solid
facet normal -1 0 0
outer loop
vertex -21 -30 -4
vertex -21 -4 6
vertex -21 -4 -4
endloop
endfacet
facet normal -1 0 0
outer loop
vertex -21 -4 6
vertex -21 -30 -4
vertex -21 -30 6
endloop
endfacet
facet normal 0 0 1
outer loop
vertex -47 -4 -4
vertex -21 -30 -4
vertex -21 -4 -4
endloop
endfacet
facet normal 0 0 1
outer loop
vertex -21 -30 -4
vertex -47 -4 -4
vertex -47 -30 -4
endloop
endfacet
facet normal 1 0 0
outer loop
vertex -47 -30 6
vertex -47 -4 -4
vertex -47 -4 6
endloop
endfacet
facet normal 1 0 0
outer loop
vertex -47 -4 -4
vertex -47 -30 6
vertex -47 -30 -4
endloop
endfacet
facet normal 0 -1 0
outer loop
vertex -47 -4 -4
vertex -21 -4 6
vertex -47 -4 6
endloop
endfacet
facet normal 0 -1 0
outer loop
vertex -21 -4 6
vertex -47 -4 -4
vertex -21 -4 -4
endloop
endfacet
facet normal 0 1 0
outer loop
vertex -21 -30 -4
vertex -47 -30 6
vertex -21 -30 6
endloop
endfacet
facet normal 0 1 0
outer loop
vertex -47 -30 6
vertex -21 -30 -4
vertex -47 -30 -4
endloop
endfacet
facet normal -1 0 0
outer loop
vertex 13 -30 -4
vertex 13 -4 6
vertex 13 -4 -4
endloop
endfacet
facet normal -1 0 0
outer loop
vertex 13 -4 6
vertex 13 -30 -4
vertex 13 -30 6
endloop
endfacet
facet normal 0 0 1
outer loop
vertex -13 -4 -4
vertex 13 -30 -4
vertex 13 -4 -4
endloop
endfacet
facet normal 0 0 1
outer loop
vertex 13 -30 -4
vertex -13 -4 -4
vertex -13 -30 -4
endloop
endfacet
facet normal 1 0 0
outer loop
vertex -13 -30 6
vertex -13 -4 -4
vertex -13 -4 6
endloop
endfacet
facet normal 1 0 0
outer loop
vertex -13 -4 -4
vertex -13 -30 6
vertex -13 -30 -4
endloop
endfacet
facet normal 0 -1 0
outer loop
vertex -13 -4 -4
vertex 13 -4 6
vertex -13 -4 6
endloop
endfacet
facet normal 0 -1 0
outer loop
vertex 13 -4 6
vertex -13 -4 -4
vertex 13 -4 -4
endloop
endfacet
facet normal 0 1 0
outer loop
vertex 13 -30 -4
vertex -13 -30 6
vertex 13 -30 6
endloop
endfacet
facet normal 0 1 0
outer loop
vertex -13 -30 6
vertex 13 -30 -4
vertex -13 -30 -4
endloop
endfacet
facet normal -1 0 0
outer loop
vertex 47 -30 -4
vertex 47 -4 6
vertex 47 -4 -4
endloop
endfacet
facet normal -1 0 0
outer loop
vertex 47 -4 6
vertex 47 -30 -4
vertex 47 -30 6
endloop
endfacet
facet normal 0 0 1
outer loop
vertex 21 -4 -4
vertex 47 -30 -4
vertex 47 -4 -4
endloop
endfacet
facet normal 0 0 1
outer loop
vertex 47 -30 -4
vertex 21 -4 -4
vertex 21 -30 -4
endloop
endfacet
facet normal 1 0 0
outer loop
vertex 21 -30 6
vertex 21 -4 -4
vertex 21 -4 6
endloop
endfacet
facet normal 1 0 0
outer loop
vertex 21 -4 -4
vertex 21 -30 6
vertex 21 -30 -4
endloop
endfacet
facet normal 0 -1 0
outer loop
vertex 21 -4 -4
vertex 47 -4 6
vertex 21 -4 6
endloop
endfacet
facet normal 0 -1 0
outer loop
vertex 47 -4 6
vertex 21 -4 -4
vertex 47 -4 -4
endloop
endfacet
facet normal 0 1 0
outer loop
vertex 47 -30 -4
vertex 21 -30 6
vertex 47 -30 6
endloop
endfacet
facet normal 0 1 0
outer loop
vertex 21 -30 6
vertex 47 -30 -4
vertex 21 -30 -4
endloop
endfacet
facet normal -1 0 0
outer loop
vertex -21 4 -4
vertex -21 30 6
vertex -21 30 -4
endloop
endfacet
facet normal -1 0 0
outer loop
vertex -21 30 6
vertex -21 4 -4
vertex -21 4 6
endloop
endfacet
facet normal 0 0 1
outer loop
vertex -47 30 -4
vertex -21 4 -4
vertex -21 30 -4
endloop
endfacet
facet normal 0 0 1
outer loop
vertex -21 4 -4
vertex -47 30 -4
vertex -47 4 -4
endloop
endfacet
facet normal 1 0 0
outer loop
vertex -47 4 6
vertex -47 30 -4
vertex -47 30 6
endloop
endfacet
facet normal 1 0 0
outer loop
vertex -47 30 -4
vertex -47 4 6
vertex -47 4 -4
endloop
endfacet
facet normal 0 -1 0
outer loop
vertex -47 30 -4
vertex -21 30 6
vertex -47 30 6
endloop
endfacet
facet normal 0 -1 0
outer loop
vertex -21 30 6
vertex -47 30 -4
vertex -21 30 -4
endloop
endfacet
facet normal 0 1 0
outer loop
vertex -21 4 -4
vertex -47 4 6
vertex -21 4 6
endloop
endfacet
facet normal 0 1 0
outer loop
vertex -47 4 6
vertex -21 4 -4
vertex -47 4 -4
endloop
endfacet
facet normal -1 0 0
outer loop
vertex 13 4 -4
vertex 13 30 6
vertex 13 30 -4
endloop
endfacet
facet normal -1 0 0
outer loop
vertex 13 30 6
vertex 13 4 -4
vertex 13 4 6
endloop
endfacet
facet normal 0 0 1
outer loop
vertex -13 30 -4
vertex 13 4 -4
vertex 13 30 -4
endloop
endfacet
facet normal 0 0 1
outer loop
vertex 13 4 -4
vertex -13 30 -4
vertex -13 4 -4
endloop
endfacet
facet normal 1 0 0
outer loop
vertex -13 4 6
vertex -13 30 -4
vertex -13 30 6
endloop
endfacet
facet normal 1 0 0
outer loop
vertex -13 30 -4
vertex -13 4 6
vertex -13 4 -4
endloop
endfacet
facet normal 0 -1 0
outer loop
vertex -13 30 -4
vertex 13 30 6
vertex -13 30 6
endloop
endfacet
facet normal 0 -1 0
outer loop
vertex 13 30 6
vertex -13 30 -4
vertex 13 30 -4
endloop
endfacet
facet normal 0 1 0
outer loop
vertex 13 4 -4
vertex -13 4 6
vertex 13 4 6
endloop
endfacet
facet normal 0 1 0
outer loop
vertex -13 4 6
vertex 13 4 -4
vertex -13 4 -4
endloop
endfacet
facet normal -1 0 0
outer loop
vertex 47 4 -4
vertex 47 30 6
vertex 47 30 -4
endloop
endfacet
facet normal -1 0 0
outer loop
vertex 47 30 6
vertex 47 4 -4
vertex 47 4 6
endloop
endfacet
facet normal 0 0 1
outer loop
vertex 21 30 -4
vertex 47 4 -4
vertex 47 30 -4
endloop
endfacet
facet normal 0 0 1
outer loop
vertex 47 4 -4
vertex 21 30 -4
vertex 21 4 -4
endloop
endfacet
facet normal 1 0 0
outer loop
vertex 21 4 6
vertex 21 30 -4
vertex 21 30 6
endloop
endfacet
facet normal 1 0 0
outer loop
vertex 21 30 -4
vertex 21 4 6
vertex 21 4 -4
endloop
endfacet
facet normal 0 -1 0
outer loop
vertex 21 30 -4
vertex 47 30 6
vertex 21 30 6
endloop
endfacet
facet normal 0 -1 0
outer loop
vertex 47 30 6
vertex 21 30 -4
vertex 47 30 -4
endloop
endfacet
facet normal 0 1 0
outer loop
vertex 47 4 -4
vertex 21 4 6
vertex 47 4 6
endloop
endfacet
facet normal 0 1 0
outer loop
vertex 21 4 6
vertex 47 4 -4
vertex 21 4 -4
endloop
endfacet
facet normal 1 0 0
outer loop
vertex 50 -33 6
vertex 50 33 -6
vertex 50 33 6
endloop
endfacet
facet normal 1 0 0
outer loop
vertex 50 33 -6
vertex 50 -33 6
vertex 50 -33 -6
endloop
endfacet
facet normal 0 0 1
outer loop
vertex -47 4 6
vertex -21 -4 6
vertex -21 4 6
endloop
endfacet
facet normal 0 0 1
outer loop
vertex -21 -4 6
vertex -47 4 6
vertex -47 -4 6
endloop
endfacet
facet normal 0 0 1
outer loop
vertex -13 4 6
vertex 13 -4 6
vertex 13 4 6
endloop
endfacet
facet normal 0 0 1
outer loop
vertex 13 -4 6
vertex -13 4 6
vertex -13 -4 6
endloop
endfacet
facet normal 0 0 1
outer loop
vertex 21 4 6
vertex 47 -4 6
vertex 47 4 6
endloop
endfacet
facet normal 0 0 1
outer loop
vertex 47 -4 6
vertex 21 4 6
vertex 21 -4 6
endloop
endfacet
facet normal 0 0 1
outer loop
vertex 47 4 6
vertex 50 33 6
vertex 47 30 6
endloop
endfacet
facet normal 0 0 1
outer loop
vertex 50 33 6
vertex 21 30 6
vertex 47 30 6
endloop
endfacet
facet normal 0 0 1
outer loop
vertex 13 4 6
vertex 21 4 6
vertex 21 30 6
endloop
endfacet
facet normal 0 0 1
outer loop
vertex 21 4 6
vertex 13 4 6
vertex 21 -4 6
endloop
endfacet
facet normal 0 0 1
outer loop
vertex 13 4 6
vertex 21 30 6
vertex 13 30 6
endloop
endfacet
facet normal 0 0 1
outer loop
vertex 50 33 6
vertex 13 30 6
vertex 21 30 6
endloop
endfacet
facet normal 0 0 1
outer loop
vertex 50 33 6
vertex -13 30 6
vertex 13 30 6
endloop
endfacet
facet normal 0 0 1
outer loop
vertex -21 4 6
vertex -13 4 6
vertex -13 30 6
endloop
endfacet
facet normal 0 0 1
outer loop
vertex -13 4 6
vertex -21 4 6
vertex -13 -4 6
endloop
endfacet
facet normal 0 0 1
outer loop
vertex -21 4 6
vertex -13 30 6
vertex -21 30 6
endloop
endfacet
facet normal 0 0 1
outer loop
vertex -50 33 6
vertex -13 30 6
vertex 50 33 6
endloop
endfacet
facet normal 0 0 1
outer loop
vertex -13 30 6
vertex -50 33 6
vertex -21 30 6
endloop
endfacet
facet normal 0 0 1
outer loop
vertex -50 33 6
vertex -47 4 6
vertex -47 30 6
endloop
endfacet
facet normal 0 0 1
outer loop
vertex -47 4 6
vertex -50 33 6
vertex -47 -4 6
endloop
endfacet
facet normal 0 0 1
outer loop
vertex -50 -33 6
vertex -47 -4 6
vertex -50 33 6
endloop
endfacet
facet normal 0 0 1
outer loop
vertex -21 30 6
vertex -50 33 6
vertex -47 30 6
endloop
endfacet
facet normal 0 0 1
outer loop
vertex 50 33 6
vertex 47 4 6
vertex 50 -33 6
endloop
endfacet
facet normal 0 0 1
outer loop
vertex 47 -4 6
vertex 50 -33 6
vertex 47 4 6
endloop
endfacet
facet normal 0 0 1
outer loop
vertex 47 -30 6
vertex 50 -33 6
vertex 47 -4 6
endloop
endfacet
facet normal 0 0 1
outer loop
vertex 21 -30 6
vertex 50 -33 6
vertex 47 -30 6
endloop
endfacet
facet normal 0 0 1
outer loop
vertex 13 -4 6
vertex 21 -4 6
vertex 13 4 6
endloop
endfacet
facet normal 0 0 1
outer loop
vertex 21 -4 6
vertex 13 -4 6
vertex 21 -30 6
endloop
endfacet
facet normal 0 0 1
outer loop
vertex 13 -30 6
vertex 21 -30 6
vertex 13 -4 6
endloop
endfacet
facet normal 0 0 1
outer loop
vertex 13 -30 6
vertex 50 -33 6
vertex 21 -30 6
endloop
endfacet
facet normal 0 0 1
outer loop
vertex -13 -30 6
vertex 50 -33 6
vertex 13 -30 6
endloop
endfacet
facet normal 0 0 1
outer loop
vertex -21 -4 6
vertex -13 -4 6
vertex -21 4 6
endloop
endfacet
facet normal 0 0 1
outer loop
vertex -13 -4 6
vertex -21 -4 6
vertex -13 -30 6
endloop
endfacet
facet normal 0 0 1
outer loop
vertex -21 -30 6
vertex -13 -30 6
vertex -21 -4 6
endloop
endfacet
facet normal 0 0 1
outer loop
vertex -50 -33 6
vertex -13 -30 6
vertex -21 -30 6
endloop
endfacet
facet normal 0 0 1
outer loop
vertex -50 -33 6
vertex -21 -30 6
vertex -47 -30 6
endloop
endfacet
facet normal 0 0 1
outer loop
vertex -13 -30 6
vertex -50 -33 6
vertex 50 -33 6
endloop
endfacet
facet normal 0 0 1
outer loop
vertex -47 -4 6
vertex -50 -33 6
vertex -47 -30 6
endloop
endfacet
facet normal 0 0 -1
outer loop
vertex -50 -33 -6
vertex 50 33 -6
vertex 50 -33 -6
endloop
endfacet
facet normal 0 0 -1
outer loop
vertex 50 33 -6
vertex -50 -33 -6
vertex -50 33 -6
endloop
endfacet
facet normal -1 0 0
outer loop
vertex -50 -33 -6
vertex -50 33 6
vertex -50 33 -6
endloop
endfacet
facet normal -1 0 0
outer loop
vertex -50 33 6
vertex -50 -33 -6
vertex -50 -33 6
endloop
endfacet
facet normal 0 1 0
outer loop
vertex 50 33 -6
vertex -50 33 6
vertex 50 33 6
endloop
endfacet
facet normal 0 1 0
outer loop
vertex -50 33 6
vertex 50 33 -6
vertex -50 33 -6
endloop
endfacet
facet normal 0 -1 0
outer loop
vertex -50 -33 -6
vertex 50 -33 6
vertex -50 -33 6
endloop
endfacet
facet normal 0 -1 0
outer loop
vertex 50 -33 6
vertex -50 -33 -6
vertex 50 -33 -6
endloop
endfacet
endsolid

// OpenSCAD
$fn = 32;

// ----------------------------------------------------------------------
// Pocket plate 100 x 66 x 12
// 2 x 3 pockets 26 mm square, 10 mm deep
// ----------------------------------------------------------------------

// --- parameters (mm) ---
thickness = 12;  // plate thickness
floor_t = 2;     // material left under each pocket
pocket = 26;     // pocket side length
pitch_x = 34;    // pocket pitch along X
pitch_y = 34;    // pocket pitch along Y
cols = 3;        // pockets per row
rows = 2;        // rows of pockets

// --- derived feature positions (mm) ---
depth = thickness - floor_t;        // = 10   pocket depth, down to the floor
span_x = (cols - 1) * pitch_x;      // = 68   distance between outer pockets
span_y = (rows - 1) * pitch_y;      // = 34   distance between outer pocket rows
origin_x = -span_x / 2;             // = -34   X of the first pocket
origin_y = -span_y / 2;             // = -17   Y of the first pocket
plate = [span_x + pocket + 6, span_y + pocket + 6, thickness];  // = [100, 66, 12]   overall size: pockets plus 3 mm of wall on each side
feature_centers = [
  [origin_x + 0 * pitch_x, origin_y + 0 * pitch_y],
  [origin_x + 1 * pitch_x, origin_y + 0 * pitch_y],
  [origin_x + 2 * pitch_x, origin_y + 0 * pitch_y],
  [origin_x + 0 * pitch_x, origin_y + 1 * pitch_y],
  [origin_x + 1 * pitch_x, origin_y + 1 * pitch_y],
  [origin_x + 2 * pitch_x, origin_y + 1 * pitch_y]
];   // pocket centres, used verbatim by the cutter loop

// plate outline, then one pocket per centre in feature_centers
difference() {
  cube(plate, center = true);
  for (centre = feature_centers)
    translate([centre[0] - pocket / 2, centre[1] - pocket / 2, plate[2] / 2 - depth])
      cube([pocket, pocket, depth + 1]);  // centred on the declared pocket centre
}
